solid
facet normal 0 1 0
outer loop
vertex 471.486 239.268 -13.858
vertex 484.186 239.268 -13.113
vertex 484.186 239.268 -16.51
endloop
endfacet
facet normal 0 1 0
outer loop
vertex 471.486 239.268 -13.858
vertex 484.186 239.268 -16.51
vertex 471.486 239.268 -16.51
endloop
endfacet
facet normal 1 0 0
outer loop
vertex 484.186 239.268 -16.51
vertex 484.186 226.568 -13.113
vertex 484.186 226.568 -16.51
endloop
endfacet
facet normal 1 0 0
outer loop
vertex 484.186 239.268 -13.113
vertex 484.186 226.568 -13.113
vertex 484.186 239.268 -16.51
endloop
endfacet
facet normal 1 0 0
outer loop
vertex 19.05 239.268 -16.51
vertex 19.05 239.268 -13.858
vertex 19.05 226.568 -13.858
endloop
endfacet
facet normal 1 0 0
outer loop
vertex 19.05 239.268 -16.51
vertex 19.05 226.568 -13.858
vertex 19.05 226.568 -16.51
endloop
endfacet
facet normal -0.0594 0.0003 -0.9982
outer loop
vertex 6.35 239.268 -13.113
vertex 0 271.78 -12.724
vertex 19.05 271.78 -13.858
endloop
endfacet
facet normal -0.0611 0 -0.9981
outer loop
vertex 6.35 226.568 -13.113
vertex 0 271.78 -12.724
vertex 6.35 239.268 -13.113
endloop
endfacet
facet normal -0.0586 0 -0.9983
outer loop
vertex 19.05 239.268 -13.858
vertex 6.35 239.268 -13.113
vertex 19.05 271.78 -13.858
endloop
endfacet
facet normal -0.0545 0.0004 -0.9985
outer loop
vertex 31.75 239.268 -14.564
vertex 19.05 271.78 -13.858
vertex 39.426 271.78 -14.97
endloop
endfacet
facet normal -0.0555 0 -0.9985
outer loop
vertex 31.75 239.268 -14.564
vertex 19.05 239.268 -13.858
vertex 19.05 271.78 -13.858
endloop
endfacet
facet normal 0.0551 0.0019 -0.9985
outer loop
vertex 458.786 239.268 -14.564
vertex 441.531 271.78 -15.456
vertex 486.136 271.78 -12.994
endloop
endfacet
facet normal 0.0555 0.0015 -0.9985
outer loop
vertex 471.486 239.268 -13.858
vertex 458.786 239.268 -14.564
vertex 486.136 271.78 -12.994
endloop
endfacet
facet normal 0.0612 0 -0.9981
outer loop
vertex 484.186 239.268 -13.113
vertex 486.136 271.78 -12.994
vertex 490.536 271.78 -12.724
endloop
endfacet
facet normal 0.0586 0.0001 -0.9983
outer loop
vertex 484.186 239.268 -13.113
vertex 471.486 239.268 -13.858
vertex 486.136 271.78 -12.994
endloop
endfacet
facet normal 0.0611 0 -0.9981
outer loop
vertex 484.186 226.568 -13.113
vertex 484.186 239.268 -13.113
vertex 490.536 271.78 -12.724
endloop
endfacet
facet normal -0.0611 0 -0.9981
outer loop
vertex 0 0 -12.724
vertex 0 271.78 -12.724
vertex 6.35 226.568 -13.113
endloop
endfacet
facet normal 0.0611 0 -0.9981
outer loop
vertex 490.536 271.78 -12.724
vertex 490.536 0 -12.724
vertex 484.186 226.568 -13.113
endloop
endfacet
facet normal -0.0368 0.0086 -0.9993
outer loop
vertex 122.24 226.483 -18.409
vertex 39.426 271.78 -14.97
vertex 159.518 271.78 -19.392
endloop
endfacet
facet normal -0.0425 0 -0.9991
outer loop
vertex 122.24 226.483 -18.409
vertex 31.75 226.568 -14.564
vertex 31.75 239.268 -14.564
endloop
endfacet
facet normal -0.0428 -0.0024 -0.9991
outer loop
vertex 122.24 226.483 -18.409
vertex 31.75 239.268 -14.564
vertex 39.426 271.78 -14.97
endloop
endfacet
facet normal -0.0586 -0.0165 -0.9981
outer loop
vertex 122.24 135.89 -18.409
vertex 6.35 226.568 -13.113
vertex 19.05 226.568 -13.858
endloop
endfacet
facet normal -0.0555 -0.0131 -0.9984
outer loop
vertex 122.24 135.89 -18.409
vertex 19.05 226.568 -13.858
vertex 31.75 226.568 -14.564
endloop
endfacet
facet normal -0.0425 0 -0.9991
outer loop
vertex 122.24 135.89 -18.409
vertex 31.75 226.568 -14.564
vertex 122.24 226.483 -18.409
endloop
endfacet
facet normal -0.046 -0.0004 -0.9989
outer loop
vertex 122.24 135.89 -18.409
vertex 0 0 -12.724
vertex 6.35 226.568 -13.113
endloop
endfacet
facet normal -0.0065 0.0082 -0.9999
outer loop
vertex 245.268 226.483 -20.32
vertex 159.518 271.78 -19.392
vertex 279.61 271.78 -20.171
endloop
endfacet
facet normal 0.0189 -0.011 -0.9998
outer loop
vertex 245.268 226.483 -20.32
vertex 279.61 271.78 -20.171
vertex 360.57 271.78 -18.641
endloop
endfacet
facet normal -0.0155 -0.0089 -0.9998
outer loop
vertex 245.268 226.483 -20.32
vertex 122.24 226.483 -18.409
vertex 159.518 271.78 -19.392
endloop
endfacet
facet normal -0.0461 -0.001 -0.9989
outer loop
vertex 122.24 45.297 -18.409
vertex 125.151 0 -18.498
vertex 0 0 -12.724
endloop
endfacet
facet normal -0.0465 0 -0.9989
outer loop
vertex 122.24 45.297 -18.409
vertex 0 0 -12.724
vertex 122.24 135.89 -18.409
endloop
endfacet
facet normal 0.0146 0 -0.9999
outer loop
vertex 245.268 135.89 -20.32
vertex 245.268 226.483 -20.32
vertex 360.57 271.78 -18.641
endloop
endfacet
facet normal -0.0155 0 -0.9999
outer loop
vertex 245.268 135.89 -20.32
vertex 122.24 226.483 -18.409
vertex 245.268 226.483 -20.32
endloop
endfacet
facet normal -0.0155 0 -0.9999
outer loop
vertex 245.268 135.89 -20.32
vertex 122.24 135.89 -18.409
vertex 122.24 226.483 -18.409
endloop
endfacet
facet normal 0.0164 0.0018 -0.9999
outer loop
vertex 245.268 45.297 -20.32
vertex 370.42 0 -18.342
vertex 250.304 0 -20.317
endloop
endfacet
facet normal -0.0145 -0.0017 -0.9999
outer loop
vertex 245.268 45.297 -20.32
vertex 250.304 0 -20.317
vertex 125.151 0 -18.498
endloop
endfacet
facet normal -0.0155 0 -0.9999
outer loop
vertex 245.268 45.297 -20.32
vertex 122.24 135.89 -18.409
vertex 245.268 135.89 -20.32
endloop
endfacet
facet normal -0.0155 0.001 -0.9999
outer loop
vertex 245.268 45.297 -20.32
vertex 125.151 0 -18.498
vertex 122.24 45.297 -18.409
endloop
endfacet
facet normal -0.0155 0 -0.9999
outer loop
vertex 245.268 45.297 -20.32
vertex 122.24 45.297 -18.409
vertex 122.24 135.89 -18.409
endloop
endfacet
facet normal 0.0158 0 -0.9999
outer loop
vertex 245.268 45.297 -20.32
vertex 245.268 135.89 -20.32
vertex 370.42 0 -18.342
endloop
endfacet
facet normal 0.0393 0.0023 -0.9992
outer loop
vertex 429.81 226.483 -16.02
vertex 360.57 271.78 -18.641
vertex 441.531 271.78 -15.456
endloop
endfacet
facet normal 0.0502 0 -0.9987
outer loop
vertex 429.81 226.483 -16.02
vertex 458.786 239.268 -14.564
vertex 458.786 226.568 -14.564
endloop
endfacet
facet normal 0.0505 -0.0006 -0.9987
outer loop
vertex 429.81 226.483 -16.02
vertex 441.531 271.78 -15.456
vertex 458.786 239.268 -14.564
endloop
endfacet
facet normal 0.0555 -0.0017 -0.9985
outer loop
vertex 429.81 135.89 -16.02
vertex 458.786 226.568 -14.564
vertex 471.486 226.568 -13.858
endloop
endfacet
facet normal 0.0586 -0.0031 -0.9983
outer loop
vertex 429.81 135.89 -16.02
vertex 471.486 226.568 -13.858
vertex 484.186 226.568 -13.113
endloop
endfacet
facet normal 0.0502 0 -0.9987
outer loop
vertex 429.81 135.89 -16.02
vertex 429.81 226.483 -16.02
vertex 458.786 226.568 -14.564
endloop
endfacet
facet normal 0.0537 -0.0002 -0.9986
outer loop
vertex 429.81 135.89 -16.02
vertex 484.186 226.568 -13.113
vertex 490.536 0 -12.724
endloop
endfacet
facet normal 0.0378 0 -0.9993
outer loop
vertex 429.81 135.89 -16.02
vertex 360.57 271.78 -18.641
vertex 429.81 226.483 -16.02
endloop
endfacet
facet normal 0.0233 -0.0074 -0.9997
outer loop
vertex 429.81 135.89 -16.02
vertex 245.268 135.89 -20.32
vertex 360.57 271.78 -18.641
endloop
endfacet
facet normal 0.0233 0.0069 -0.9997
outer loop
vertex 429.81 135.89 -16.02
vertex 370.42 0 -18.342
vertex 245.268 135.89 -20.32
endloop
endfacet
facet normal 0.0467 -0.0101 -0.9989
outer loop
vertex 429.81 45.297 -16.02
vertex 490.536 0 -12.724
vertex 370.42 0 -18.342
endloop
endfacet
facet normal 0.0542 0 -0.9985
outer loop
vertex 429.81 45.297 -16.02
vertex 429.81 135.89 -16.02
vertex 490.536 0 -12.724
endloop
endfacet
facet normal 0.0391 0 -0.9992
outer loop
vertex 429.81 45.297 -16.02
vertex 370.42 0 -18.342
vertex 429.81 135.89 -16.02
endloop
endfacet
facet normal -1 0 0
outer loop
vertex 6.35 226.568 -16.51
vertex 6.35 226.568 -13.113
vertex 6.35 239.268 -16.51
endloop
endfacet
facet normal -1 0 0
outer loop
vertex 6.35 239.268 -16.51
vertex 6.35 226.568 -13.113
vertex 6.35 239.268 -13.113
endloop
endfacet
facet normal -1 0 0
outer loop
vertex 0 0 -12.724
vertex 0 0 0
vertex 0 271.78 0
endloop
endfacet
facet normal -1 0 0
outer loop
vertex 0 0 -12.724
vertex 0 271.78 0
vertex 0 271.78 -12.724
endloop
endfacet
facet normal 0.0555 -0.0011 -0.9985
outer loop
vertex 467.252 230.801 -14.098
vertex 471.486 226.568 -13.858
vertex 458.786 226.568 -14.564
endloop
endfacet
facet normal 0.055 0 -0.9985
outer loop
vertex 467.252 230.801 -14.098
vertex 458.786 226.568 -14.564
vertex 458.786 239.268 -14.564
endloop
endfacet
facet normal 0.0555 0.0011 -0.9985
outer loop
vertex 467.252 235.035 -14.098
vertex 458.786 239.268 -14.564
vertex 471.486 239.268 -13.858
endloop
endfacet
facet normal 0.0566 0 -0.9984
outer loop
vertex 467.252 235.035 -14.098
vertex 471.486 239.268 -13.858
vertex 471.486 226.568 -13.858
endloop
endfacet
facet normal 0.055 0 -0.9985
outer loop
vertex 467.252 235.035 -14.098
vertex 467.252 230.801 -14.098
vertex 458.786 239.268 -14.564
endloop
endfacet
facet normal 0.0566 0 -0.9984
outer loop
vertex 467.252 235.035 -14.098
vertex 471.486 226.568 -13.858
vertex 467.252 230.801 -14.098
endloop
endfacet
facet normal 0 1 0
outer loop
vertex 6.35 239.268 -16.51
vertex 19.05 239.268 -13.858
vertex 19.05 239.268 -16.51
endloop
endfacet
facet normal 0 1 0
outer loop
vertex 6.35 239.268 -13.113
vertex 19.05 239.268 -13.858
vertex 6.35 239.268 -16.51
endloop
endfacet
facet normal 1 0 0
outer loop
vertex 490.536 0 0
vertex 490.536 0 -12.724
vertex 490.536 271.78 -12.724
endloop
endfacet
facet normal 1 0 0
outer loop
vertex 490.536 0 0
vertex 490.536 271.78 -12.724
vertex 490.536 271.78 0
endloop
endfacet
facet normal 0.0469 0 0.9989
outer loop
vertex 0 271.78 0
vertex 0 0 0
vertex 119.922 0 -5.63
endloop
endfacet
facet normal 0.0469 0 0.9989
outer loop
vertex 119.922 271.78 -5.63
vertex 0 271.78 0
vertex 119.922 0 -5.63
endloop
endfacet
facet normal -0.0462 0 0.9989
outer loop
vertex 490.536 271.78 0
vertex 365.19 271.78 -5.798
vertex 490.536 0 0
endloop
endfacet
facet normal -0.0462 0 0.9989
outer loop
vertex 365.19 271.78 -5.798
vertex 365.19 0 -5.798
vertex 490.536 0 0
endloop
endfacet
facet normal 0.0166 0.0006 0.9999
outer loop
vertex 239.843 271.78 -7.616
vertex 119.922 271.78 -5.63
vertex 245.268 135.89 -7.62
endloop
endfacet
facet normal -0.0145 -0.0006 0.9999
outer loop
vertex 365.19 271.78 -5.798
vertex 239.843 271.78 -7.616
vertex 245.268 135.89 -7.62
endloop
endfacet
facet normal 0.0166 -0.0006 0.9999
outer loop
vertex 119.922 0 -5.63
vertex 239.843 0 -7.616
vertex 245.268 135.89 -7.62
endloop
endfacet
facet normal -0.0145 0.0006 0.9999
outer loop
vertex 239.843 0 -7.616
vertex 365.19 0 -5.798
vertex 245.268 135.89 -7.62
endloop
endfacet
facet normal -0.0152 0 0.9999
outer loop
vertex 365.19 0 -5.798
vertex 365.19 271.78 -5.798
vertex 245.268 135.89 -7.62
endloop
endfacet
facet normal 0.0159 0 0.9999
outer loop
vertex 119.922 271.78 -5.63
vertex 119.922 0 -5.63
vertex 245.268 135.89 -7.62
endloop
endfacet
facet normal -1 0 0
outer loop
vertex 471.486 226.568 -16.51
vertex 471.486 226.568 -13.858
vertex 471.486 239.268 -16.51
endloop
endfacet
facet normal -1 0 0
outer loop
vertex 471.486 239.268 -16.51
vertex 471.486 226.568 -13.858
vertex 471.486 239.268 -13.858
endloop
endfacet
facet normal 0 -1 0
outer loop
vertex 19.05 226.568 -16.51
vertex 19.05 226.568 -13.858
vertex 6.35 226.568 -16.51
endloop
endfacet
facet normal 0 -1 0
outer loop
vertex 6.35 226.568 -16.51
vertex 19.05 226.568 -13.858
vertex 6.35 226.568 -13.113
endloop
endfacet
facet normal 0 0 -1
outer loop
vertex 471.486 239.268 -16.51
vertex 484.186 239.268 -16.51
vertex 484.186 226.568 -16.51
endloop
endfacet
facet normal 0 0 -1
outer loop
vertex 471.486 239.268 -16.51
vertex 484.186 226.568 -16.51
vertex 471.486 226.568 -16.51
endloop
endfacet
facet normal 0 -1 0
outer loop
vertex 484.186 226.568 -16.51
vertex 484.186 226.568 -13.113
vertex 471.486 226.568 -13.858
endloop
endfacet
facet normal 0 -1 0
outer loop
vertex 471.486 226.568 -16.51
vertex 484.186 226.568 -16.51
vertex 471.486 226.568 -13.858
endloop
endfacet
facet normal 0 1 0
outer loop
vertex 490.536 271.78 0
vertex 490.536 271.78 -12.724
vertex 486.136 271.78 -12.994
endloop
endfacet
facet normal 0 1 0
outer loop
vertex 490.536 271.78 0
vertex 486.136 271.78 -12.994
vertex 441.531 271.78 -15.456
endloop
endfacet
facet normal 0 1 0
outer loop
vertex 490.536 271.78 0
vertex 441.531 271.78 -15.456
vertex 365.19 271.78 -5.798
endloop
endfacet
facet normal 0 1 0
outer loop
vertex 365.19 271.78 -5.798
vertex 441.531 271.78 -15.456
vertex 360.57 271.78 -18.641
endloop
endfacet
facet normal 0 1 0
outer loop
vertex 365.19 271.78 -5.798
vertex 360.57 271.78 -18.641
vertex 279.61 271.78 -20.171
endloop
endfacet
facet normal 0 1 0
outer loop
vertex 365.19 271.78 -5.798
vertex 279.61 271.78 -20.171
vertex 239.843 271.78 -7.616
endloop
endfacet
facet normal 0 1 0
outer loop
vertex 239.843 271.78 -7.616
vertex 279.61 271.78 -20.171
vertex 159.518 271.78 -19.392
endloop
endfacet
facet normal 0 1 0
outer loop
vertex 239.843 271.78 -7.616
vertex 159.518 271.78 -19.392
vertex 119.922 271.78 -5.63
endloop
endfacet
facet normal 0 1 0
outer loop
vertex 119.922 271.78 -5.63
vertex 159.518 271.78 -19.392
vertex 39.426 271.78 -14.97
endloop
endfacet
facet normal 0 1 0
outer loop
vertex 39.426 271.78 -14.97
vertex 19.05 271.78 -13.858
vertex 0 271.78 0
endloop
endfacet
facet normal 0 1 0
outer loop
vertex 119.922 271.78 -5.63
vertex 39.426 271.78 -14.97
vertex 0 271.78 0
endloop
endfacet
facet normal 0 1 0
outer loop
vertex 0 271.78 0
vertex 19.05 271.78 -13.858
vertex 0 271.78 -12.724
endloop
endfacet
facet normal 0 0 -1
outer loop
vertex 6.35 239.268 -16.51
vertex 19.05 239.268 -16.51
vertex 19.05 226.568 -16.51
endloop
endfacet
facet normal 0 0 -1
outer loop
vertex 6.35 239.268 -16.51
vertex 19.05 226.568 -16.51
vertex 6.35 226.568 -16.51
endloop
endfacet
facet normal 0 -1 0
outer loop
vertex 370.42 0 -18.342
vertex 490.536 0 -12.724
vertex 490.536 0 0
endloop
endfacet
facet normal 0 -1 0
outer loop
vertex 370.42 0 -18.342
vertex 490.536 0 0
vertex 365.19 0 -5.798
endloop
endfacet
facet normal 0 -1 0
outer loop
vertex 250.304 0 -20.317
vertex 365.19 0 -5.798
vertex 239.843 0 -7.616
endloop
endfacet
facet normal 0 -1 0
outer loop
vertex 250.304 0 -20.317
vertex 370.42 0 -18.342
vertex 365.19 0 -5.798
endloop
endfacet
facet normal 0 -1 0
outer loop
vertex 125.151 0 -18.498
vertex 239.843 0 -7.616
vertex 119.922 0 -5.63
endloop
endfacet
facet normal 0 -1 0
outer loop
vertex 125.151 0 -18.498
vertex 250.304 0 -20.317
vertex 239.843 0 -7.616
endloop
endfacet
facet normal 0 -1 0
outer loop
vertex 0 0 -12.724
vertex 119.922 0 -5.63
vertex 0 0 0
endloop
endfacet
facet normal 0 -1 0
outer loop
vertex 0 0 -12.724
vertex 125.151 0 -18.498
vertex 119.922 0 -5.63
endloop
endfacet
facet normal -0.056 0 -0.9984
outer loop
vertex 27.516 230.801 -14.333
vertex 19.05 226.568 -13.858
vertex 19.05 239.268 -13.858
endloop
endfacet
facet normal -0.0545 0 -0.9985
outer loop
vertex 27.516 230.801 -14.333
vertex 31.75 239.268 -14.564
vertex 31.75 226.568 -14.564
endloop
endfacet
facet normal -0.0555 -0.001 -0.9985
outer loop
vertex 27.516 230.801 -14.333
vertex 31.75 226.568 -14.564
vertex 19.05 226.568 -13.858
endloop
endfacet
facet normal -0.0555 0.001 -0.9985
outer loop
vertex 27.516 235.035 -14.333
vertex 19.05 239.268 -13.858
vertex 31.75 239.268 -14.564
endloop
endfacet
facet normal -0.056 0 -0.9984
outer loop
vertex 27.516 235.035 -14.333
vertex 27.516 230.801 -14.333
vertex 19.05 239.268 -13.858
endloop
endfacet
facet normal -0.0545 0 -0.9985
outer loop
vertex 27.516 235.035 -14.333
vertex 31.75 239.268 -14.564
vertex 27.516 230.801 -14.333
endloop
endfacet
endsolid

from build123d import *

# Parameters (mm, degrees)
BOSS_EXTRUDE1_DEPTH = 271.78
SKETCH4_W           = 12.7
SKETCH4_H           = 12.7
BOSS_EXTRUDE2_DEPTH = 7.62
CUT_EXTRUDE1_DEPTH  = 562.161666545
CUT_EXTRUDE2_DEPTH  = 562.161666545


with BuildPart() as part:
    # Sketch3 → Boss-Extrude1 (new body)
    with BuildSketch(Plane(origin=(0, 0, 0), x_dir=(1, 0, 0), z_dir=(0, 1, 0))):
        with BuildLine():
            Line((0, 0), (0, 12.72441479))
            add(Edge.make_bspline(
                [(0, 12.72441479), (20.233071215, 13.977592464), (60.992424476, 16.189695121), (142.741781458, 19.364277715), (245.2677848, 20.95714819), (347.793788142, 19.364277715), (429.543145124, 16.189695121), (470.302498385, 13.977592464), (490.5355696, 12.72441479)],
                knots=[0.001601193, 0.001601193, 0.001601193, 0.001601193, 0.125, 0.25, 0.5, 0.75, 0.875, 0.998398807, 0.998398807, 0.998398807, 0.998398807], degree=3))
            Line((490.5355696, 12.72441479), (490.5355696, 0))
            add(Edge.make_bspline(
                [(0, 0), (245.2677848, 15.24), (490.5355696, 0)],
                knots=[0, 0, 0, 1, 1, 1], degree=2))
        make_face()
    extrude(amount=BOSS_EXTRUDE1_DEPTH)

    # Sketch4 → Boss-Extrude2 (add)
    with BuildSketch(Plane.XY.offset(-8.89)):
        with Locations((12.7, 232.918)):
            Rectangle(SKETCH4_W, SKETCH4_H)
        with Locations((465.1355696, 232.918)):
            Rectangle(SKETCH4_W, SKETCH4_H)
    boss_extrude2 = extrude(amount=-BOSS_EXTRUDE2_DEPTH)

    # Sketch5 → Cut-Extrude1 (cut, through all)
    with BuildSketch(Plane(origin=(0, 271.78, 0), x_dir=(1, 0, 0), z_dir=(0, 1, 0))):
        with BuildLine():
            Line((486.135566794, 12.994491849), (486.135566794, 38.953188641))
            Line((486.135566794, 38.953188641), (439.07442157, 31.940350217))
            Line((439.07442157, 31.940350217), (441.530786222, 15.456392275))
            add(Edge.make_bspline(
                [(486.135566794, 12.994491849), (471.272243027, 13.898556621), (456.401448688, 14.719348346), (441.530786222, 15.456392275)],
                knots=[0.01054573, 0.01054573, 0.01054573, 0.01054573, 0.101185718, 0.101185718, 0.101185718, 0.101185718], degree=3))
        make_face()
    extrude(amount=-CUT_EXTRUDE1_DEPTH, mode=Mode.SUBTRACT)

    # Mirror2: Boss-Extrude2 across plane
    add(boss_extrude2.mirror(Plane.ZY.offset(-245.2677848)))

    # Sketch6 → Cut-Extrude2 (cut, through all)
    with BuildSketch(Plane(origin=(0, 271.78, 0), x_dir=(1, 0, 0), z_dir=(0, 1, 0))):
        with BuildLine():
            Line((19.05, 13.858474742), (19.05, 29.417888146))
            Line((19.05, 29.417888146), (39.010886376, 22.948973115))
            Line((39.010886376, 22.948973115), (39.425645252, 14.970033585))
            add(Edge.make_bspline(
                [(39.425645252, 14.970033585), (32.633208906, 14.616951167), (25.841085641, 14.24641647), (19.05, 13.858474742)],
                knots=[0.918276722, 0.918276722, 0.918276722, 0.918276722, 0.959678947, 0.959678947, 0.959678947, 0.959678947], degree=3))
        make_face()
    extrude(amount=-CUT_EXTRUDE2_DEPTH, mode=Mode.SUBTRACT)


solid = part.part
